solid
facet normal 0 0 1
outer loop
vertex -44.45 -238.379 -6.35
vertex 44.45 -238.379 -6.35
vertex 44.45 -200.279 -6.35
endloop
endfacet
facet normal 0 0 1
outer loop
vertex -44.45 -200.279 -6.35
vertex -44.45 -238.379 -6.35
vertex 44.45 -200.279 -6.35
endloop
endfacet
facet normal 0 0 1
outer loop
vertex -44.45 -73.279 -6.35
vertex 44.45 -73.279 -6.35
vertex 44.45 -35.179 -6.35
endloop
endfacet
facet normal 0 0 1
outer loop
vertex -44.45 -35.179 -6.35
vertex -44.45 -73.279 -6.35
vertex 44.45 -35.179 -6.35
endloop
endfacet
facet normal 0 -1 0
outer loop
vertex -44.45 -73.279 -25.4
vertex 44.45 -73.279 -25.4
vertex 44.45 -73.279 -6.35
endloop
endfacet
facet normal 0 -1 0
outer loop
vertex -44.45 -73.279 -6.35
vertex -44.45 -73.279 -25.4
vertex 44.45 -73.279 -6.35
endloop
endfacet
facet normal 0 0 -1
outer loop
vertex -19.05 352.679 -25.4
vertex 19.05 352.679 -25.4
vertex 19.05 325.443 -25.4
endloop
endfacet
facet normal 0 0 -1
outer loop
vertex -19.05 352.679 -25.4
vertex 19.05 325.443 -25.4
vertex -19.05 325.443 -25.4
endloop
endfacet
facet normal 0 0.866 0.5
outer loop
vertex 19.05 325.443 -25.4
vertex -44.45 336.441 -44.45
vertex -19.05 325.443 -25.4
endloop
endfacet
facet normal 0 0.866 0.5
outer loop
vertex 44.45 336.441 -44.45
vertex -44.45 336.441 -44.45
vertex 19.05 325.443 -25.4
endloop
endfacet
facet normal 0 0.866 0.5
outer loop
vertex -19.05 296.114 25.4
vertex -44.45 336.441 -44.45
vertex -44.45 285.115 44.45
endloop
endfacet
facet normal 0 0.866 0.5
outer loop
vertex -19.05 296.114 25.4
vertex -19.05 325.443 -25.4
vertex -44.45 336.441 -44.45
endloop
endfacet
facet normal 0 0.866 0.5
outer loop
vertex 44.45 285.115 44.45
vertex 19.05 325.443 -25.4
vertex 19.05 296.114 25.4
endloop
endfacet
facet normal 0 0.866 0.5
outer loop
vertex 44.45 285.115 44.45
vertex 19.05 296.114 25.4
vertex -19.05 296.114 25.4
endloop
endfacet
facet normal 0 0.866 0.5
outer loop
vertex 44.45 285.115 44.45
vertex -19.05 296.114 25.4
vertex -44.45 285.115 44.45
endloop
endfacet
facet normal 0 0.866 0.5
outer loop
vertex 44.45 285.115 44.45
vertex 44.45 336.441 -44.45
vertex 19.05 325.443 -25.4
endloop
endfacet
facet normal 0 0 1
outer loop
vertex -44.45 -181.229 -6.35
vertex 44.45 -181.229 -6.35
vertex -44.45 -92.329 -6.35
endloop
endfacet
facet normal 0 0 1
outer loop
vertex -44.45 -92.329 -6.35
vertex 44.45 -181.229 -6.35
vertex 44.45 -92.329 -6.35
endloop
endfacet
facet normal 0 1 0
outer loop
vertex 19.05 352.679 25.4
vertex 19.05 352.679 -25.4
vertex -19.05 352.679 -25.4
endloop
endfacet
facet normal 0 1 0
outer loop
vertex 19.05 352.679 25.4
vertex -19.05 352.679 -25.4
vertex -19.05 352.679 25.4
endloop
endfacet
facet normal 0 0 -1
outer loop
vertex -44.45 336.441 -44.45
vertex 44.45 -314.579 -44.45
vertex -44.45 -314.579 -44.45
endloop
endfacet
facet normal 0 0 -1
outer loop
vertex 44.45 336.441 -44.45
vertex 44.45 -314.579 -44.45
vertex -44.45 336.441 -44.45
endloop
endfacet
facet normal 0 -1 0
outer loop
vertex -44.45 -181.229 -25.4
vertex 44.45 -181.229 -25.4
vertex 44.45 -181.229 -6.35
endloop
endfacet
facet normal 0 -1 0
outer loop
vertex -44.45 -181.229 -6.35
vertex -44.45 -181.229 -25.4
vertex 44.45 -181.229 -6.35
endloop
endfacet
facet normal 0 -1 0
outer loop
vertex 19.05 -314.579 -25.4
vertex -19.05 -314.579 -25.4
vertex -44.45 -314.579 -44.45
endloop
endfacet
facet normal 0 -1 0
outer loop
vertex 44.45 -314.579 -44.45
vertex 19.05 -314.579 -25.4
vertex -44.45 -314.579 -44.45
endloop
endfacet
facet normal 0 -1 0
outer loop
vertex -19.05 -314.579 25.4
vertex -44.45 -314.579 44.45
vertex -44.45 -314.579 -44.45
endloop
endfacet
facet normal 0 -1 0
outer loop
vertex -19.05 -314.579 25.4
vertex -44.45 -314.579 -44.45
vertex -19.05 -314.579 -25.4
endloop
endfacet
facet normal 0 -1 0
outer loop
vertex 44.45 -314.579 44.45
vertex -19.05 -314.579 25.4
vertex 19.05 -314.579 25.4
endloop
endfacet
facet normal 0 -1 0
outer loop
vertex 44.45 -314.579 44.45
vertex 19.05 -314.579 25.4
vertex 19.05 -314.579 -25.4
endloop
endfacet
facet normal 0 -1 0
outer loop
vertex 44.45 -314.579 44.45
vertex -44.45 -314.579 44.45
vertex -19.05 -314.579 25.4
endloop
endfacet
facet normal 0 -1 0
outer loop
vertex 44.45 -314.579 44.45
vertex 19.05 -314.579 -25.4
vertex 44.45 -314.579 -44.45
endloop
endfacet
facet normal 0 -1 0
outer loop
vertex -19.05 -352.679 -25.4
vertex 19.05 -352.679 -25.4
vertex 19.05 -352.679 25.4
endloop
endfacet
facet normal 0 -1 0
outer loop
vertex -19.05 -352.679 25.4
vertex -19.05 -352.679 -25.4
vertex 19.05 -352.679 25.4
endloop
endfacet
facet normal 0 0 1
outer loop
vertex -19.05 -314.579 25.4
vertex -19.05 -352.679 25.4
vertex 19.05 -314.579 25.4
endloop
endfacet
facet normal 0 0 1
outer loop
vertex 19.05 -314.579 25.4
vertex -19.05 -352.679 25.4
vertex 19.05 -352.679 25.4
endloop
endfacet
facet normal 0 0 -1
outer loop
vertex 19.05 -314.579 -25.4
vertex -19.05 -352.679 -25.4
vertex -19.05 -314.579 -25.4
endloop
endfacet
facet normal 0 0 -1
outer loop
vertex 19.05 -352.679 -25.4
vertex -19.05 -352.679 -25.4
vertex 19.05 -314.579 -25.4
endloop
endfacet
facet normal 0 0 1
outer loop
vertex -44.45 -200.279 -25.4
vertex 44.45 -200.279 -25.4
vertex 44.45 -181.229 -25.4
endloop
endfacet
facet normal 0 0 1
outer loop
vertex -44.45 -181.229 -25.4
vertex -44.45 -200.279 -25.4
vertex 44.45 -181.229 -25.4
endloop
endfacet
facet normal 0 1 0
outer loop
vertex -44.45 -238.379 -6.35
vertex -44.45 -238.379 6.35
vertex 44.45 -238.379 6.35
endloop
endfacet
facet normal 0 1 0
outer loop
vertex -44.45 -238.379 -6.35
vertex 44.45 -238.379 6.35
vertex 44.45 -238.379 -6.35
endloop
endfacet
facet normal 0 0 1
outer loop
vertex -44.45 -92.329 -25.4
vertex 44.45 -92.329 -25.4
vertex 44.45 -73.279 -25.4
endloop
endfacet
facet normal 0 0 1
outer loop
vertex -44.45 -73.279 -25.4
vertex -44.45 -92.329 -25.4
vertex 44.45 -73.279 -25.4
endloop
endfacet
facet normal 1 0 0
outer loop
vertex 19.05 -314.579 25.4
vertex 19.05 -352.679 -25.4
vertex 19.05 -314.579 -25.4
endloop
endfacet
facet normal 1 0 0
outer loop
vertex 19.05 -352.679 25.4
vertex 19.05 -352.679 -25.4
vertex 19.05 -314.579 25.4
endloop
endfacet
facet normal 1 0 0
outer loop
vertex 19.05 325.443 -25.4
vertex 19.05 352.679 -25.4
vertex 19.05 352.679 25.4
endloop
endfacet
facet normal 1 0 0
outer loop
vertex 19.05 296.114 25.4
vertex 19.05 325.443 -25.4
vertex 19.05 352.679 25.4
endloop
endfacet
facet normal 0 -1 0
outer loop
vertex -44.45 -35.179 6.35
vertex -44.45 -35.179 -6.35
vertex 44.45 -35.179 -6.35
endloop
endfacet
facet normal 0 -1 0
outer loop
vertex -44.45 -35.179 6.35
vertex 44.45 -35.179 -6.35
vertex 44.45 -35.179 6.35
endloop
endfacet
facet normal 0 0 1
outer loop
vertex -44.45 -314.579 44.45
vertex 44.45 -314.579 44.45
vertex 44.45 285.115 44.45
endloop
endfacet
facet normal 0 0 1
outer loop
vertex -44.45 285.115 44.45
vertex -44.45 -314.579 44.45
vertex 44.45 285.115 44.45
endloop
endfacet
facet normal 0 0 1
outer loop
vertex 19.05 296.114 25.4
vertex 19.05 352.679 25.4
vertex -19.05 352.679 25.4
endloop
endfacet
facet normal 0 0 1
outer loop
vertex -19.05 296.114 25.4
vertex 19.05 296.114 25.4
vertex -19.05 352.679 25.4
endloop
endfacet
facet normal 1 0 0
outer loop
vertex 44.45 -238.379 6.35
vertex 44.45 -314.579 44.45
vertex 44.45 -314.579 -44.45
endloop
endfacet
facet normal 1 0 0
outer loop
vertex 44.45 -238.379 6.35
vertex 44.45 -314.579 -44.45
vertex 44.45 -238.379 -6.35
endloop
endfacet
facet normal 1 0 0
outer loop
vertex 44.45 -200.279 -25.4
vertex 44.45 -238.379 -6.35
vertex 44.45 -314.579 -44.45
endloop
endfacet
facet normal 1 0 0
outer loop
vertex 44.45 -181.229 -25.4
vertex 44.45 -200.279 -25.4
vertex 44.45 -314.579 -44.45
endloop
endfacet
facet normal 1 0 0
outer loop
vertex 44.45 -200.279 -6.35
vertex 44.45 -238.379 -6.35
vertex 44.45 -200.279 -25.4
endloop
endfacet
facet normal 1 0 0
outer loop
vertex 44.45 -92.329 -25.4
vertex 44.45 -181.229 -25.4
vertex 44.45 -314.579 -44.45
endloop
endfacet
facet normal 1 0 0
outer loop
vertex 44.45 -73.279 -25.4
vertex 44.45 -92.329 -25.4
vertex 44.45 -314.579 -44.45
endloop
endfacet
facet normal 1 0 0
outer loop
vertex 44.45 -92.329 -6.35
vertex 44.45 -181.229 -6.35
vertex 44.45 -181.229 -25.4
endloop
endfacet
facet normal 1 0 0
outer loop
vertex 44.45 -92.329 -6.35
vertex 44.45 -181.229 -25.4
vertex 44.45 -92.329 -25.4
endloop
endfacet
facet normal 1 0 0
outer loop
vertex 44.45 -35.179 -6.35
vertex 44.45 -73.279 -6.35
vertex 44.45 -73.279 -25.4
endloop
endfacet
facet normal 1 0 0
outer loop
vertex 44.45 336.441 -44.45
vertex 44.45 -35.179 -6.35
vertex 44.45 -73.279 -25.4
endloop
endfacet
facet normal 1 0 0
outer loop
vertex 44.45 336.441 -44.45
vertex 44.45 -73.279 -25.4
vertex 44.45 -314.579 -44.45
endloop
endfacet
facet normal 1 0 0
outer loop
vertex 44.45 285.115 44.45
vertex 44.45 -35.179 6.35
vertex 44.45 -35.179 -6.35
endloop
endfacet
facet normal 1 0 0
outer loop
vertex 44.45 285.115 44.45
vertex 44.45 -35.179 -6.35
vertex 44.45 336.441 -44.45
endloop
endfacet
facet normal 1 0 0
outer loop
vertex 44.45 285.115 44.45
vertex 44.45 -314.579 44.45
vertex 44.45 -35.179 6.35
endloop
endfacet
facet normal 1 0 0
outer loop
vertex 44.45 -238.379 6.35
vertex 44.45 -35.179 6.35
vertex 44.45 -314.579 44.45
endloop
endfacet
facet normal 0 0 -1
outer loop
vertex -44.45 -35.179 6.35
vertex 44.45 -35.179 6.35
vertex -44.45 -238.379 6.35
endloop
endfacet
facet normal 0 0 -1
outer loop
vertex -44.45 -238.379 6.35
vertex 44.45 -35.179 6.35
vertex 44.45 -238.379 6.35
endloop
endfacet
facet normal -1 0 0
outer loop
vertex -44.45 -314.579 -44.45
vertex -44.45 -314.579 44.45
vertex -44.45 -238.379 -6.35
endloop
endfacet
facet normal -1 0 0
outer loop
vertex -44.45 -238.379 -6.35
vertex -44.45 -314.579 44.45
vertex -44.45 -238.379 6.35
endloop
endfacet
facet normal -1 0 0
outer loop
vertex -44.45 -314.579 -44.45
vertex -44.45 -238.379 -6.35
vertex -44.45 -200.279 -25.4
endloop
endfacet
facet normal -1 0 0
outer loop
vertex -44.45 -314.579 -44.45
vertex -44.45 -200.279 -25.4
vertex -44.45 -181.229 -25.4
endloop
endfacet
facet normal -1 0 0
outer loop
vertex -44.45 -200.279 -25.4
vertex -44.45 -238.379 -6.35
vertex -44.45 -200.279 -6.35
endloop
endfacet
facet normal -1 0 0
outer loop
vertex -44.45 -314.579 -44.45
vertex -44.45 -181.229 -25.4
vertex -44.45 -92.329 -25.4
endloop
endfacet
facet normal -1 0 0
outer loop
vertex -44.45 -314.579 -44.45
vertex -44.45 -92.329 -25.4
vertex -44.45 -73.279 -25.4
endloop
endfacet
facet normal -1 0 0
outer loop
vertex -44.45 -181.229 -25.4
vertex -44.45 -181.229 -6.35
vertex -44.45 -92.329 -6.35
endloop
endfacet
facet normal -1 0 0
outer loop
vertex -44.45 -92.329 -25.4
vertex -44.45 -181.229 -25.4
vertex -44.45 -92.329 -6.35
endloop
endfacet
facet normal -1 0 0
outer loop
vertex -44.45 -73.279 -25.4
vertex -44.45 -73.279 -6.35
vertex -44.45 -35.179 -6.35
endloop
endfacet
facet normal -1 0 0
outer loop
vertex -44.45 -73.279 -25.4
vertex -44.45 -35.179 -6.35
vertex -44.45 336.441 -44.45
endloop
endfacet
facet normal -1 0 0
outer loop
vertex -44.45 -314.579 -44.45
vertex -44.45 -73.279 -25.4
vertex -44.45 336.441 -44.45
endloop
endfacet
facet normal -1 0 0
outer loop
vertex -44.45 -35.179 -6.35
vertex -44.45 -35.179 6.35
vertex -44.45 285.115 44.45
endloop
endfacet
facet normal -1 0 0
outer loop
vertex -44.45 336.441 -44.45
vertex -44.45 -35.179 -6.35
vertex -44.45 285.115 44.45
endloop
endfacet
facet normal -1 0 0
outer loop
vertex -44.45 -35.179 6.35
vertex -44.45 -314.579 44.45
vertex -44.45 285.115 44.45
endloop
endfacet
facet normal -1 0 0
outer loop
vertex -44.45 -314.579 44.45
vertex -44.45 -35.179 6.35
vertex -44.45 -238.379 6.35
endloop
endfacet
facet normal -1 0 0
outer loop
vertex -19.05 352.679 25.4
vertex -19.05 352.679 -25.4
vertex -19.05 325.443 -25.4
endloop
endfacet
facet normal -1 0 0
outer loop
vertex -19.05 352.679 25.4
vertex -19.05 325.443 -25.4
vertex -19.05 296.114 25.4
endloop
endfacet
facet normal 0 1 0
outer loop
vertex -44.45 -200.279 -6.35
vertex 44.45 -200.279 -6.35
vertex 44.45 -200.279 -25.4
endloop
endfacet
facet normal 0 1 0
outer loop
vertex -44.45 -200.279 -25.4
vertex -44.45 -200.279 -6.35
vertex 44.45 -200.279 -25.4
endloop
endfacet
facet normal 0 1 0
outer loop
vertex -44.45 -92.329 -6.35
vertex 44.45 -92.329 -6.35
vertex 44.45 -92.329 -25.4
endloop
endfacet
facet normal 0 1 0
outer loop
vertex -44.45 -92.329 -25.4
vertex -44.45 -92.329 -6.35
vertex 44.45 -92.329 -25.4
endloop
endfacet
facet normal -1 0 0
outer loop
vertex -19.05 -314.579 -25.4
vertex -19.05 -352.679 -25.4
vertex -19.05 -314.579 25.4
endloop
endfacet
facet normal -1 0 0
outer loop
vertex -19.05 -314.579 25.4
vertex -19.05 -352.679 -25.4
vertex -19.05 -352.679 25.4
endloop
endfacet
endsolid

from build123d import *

# Parameters (mm, degrees)
F0_W     = 705.358
F0_H     = 88.9
F1_DEPTH = 44.45
F4_W     = 88.9
F4_H     = 88.9
F4_W_2   = 38.1
F4_H_2   = 50.8
F5_REACH = 193.287585695
F6_W     = 88.9
F6_H     = 88.9
F6_W_2   = 38.1
F6_H_2   = 50.8
F7_DEPTH = 38.1
F9_DEPTH = 88.901


with BuildPart() as f1:
    # F0 (on Right) → F1 (new body, symmetric)
    with BuildSketch(Plane.YZ):
        Rectangle(F0_W, F0_H)
    extrude(amount=F1_DEPTH, both=True)

    f5_end = Plane(origin=(0, 233.0836645991, 134.5709165), x_dir=(0, -0.5, 0.8660254038), z_dir=(0, 0.8660254038, 0.5))
    # F4 (on face) → F5 (cut, up to a plane its end follows)
    with BuildSketch(Plane(origin=(0, 352.679, 0), x_dir=(-1, 0, 0), z_dir=(0, 1, 0))):
        Rectangle(F4_W, F4_H)
        Rectangle(F4_W_2, F4_H_2, mode=Mode.SUBTRACT)
    f5_long = extrude(amount=-F5_REACH, mode=Mode.PRIVATE)
    add(split(f5_long, bisect_by=f5_end, keep=Keep.TOP, mode=Mode.PRIVATE), mode=Mode.SUBTRACT)

    # F6 (on face) → F7 (cut)
    with BuildSketch(Plane.XZ.offset(352.679)):
        Rectangle(F6_W, F6_H)
        Rectangle(F6_W_2, F6_H_2, mode=Mode.SUBTRACT)
    extrude(amount=-F7_DEPTH, mode=Mode.SUBTRACT)

    # F8 (on face) → F9 (cut, through all)
    with BuildSketch(Plane.YZ.offset(44.45)):
        Polygon((-35.179, -6.35), (-35.179, 6.35), (-238.379, 6.35), (-238.379, -6.35), (-200.279, -6.35), (-200.279, -25.4), (-181.229, -25.4), (-181.229, -6.35), (-92.329, -6.35), (-92.329, -25.4), (-73.279, -25.4), (-73.279, -6.35), align=None)
    extrude(amount=-F9_DEPTH, mode=Mode.SUBTRACT)


solid = f1.part
